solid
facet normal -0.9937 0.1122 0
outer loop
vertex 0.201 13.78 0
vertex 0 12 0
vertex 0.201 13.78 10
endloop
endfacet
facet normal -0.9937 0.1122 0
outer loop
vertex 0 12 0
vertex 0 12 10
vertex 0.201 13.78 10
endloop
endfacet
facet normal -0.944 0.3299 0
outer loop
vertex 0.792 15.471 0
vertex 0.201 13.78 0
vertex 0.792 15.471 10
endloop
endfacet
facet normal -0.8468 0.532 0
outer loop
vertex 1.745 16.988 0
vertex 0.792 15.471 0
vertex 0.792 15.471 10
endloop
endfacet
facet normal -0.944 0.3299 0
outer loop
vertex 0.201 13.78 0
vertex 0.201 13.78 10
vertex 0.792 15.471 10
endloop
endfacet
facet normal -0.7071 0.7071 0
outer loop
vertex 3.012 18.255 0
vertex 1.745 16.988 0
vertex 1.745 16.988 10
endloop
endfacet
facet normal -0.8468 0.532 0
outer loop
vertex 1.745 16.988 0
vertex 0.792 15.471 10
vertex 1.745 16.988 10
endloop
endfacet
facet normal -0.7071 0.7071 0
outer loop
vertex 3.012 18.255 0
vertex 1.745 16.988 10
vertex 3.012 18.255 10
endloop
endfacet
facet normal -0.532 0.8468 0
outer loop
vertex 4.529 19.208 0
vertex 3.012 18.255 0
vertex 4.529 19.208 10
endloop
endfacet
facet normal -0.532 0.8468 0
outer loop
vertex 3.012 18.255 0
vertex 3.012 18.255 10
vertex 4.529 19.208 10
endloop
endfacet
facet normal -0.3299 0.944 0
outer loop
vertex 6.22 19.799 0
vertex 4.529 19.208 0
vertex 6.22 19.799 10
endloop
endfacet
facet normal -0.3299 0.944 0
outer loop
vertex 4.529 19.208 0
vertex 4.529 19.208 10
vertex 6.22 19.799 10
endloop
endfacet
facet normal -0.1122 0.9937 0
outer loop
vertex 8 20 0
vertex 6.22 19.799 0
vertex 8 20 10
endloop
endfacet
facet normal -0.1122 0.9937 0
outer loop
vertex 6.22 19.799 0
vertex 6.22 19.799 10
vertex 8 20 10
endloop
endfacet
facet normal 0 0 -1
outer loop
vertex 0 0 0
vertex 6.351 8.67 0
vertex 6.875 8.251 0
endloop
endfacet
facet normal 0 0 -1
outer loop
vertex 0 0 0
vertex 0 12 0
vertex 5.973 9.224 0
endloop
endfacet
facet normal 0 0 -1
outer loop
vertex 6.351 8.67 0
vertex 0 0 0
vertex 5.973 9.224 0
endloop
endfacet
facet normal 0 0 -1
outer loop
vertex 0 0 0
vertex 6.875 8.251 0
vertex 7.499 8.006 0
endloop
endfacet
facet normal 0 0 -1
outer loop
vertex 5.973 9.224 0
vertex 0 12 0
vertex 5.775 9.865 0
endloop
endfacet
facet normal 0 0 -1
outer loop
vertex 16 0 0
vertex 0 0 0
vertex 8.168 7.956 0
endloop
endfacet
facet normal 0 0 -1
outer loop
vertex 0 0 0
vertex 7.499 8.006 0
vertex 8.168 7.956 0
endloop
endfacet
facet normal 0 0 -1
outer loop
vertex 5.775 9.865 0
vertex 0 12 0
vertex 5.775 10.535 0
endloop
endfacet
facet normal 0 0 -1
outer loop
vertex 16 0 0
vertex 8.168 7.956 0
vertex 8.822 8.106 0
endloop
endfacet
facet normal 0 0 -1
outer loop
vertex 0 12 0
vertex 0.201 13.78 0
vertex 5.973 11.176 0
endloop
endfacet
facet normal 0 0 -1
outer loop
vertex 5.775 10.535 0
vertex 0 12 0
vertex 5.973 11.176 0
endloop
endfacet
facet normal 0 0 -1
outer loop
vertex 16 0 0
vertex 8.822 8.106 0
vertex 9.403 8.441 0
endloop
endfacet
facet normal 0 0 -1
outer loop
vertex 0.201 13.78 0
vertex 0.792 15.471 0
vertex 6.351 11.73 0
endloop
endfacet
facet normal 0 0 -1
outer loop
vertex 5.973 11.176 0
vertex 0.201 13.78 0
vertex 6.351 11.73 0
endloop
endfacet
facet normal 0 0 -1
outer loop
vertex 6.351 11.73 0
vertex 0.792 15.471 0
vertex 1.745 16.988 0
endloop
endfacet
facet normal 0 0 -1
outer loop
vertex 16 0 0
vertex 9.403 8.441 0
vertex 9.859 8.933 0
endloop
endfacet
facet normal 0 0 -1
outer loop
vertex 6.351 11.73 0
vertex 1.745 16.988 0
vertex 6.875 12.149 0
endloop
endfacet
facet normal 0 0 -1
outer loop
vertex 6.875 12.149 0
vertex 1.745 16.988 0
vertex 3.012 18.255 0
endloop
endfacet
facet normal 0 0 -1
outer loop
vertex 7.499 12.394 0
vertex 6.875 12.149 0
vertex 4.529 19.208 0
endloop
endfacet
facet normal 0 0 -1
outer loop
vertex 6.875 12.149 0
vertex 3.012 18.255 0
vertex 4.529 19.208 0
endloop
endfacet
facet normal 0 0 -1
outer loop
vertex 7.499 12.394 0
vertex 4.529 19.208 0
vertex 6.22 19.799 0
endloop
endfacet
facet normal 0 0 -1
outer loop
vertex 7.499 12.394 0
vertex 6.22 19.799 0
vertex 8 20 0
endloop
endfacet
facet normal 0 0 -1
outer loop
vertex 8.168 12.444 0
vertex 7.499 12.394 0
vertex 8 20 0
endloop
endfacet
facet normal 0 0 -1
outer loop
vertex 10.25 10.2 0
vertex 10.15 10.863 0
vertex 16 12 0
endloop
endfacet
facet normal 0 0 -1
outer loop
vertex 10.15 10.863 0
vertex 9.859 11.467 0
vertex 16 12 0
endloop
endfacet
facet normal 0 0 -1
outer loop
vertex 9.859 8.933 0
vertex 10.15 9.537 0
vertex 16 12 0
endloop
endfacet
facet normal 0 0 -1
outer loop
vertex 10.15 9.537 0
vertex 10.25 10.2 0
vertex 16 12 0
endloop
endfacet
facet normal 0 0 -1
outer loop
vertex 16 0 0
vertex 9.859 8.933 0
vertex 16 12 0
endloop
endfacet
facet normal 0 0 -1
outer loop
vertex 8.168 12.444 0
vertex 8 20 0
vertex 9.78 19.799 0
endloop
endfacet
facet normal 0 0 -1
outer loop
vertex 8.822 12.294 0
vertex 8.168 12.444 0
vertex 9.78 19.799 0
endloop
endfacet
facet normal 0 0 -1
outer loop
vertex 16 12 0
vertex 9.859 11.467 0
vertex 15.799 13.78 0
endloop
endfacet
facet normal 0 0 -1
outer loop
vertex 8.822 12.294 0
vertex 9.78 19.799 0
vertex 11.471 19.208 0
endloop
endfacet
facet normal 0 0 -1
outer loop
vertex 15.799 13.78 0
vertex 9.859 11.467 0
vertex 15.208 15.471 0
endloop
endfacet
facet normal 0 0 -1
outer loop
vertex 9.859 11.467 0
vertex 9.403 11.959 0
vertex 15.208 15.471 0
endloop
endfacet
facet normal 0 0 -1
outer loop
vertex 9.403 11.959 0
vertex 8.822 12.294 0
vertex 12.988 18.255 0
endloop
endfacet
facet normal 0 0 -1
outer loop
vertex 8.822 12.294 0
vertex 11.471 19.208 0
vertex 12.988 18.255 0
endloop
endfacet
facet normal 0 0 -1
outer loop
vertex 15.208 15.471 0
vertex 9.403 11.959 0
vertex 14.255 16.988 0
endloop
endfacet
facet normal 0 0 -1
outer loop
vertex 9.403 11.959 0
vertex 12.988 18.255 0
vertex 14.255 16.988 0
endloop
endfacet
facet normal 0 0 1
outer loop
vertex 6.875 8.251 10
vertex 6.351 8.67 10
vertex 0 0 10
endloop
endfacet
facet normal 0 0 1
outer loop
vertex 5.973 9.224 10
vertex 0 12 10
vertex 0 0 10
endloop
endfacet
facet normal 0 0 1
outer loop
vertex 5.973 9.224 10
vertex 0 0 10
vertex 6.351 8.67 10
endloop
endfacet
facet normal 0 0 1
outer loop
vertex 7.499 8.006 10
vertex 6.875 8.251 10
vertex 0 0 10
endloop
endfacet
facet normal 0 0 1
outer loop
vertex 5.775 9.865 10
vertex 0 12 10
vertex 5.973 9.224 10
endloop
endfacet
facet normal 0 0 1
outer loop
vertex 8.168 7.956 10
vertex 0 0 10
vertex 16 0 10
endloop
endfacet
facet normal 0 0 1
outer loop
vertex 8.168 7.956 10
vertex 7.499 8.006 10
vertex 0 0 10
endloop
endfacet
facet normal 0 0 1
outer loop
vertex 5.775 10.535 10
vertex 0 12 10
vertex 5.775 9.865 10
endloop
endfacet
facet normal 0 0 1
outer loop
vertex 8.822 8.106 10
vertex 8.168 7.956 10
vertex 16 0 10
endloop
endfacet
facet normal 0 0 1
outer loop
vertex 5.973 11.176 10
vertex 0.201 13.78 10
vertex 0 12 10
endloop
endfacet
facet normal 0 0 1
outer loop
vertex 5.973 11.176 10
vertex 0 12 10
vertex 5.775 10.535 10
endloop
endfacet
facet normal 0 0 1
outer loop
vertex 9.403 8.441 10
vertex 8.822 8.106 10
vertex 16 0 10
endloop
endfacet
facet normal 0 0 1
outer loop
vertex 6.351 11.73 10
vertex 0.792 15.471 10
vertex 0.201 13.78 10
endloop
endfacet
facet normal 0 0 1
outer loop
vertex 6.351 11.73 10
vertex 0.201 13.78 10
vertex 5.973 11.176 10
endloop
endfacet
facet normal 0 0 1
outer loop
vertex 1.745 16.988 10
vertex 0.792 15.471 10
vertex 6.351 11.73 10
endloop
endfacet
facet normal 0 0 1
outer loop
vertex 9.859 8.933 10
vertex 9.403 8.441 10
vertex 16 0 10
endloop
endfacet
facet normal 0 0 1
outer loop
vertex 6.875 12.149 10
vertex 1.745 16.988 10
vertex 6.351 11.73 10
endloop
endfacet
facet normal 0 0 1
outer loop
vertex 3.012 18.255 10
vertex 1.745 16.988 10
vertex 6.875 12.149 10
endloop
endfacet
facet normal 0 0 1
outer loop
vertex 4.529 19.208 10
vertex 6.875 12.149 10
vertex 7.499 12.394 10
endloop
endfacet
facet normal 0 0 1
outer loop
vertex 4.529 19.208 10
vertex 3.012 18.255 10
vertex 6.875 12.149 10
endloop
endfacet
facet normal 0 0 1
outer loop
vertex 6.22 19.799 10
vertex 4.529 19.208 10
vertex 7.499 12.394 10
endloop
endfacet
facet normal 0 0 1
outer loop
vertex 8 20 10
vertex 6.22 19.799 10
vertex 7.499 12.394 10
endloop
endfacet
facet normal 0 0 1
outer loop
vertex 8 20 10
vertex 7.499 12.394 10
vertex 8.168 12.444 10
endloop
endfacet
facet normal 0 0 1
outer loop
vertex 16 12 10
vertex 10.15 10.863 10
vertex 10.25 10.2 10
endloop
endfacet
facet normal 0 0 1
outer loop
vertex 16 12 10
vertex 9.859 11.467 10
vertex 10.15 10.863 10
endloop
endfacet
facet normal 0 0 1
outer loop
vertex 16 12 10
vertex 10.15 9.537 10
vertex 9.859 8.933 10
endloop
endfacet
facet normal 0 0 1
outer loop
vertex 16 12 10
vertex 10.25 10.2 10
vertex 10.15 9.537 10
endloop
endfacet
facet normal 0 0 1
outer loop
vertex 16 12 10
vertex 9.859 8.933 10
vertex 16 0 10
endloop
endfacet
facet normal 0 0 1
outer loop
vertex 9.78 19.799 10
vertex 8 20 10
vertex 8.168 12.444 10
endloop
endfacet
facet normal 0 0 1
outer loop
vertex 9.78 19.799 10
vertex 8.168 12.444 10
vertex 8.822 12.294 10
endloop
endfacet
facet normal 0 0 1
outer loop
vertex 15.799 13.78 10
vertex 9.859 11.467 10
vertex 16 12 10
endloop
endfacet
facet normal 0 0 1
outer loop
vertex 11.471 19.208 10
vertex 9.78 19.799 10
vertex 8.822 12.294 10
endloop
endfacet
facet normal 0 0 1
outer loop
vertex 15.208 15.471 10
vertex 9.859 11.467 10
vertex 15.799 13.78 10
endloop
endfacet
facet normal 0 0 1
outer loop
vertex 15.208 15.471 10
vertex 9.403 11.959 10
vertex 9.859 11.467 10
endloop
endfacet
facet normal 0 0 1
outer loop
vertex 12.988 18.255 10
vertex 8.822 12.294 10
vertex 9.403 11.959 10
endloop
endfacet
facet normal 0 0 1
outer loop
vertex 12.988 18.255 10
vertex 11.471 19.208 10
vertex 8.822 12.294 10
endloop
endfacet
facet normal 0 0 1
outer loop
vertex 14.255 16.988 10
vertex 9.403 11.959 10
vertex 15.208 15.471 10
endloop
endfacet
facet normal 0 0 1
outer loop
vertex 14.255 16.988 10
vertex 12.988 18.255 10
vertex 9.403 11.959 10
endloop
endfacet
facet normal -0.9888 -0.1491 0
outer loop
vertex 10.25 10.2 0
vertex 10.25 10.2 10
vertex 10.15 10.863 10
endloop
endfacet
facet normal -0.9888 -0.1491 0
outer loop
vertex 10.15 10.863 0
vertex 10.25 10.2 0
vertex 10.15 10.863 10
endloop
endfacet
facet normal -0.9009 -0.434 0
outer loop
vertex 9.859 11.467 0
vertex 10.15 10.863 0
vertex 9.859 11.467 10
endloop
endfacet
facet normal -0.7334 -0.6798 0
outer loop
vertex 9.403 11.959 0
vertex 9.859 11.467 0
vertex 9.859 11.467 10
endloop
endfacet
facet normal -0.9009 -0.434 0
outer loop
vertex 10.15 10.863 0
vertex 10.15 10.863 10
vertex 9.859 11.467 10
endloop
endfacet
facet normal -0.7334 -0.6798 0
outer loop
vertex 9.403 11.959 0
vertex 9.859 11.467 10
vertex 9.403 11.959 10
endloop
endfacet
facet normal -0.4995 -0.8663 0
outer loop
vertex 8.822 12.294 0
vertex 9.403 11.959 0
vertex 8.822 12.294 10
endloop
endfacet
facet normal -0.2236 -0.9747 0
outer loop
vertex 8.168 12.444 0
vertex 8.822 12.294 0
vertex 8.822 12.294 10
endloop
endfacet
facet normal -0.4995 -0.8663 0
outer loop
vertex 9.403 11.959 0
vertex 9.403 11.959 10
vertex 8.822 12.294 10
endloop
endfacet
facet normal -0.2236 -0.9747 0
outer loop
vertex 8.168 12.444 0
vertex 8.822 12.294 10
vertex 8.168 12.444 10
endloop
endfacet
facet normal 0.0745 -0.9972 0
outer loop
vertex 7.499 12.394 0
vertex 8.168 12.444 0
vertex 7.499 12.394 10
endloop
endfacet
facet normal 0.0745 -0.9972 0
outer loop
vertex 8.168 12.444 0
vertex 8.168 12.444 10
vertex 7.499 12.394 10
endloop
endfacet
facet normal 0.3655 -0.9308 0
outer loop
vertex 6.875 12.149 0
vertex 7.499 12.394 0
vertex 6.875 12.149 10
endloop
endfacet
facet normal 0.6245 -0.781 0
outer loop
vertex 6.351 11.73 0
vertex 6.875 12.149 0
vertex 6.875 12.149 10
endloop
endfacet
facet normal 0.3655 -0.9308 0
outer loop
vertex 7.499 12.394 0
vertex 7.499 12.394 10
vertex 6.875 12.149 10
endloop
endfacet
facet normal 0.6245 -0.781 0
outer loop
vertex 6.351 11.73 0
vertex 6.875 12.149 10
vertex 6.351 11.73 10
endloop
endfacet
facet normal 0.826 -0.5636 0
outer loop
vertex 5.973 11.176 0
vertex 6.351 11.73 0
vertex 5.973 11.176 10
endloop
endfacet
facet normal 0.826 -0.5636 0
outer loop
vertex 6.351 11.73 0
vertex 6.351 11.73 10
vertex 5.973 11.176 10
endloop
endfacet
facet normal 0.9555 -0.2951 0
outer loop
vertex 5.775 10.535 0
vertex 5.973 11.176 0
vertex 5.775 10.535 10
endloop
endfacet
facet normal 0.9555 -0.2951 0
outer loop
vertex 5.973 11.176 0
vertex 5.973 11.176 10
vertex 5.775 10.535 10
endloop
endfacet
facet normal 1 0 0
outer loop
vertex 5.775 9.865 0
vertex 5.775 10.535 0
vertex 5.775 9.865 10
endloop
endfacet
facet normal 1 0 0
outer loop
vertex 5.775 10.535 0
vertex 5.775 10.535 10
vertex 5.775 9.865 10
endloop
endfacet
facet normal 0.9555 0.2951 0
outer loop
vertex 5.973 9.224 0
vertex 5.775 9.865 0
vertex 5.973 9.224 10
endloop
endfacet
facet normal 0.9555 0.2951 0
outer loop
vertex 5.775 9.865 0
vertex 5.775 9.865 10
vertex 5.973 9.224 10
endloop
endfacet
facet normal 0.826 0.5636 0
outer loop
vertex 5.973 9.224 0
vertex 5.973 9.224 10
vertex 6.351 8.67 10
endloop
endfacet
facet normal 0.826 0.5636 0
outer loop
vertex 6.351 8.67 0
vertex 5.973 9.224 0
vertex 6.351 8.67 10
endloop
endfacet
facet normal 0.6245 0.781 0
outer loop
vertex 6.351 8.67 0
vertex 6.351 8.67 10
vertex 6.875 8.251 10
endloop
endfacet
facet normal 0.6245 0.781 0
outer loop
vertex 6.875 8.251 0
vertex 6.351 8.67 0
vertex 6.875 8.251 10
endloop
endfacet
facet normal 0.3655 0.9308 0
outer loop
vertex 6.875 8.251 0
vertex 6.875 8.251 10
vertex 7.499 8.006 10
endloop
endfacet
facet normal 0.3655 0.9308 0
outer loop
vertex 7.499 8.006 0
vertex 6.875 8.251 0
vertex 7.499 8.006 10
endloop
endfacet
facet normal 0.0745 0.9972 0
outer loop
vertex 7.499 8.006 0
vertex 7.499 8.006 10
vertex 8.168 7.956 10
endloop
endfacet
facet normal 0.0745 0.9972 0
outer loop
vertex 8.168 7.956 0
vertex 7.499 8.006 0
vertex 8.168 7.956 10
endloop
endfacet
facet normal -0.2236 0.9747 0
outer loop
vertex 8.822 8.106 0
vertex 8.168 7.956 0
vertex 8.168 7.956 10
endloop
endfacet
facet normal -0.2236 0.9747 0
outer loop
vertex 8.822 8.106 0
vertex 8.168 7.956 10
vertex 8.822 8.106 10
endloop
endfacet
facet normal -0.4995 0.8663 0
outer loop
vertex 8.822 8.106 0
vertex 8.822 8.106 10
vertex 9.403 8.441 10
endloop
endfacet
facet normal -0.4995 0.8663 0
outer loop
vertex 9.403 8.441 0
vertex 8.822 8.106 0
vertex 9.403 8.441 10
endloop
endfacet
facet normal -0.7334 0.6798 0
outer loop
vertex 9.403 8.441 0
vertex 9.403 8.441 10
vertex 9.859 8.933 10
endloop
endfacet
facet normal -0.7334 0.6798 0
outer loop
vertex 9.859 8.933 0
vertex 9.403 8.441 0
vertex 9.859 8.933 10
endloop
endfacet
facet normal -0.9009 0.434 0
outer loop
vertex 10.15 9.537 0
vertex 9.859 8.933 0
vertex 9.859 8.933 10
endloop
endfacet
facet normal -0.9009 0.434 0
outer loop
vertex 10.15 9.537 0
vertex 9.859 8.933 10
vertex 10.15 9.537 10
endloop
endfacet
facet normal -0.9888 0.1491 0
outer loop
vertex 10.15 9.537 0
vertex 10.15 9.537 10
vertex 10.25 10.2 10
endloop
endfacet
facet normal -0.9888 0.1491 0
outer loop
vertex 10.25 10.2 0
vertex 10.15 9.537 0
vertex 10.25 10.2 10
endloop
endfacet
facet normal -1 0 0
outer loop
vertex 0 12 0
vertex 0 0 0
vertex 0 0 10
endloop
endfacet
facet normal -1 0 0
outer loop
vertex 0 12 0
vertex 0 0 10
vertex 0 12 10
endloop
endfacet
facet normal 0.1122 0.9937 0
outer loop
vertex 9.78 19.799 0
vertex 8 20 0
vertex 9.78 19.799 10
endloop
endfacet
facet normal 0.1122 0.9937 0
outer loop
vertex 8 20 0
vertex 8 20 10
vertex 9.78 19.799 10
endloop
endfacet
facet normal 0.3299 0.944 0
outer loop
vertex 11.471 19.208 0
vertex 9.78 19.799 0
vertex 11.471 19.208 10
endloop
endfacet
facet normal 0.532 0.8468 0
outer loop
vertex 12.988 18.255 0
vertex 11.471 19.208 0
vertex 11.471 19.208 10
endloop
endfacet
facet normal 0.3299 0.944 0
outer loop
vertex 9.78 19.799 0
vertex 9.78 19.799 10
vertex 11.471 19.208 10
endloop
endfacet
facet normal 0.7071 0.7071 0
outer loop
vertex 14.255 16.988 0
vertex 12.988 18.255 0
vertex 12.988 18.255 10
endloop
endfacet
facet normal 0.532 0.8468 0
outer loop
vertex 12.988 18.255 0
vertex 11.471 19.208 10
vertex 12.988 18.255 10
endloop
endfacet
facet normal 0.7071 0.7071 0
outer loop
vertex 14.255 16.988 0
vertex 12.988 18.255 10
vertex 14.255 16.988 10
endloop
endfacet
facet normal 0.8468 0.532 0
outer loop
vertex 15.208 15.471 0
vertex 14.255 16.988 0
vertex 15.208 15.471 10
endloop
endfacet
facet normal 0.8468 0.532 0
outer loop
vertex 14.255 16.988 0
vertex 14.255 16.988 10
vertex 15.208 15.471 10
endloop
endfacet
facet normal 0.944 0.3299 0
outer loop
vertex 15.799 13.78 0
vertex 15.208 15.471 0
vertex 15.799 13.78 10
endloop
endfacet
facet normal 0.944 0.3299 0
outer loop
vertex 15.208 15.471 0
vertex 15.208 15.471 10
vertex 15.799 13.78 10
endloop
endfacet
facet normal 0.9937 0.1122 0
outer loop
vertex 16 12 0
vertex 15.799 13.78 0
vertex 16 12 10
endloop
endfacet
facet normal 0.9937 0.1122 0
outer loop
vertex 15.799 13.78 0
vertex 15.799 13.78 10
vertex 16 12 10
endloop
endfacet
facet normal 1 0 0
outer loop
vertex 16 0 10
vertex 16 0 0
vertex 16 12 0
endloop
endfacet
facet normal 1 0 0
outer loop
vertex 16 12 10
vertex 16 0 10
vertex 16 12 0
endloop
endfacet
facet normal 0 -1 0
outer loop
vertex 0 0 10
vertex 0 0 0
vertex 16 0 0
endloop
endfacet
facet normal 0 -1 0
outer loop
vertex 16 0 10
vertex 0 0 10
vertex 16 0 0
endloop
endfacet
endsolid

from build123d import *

# Parameters (mm, degrees)
SKETCH1_W           = 16
SKETCH1_H           = 20
BOSS_EXTRUDE1_DEPTH = 10
SKETCH2_R           = 2.25
CUT_EXTRUDE1_DEPTH  = 28.49545417
FILLET1_R           = 8


with BuildPart() as part:
    # Sketch1 → Boss-Extrude1 (new body)
    with BuildSketch(Plane.XY):
        with Locations((8, 10)):
            Rectangle(SKETCH1_W, SKETCH1_H)
    extrude(amount=BOSS_EXTRUDE1_DEPTH)

    # Sketch2 → Cut-Extrude1 (cut, through all)
    with BuildSketch(Plane.XY.offset(10)):
        with Locations((8, 10.2)):
            Circle(SKETCH2_R)
    extrude(amount=-CUT_EXTRUDE1_DEPTH, mode=Mode.SUBTRACT)

    # Fillet1
    fillet1_edges = [part.edges().sort_by_distance(p)[0] for p in [
        (16, 20, 5),
        (0, 20, 5),
    ]]
    fillet(fillet1_edges, radius=FILLET1_R - 0.0001)  # a hair under: the kernel refuses the full size


solid = part.part
